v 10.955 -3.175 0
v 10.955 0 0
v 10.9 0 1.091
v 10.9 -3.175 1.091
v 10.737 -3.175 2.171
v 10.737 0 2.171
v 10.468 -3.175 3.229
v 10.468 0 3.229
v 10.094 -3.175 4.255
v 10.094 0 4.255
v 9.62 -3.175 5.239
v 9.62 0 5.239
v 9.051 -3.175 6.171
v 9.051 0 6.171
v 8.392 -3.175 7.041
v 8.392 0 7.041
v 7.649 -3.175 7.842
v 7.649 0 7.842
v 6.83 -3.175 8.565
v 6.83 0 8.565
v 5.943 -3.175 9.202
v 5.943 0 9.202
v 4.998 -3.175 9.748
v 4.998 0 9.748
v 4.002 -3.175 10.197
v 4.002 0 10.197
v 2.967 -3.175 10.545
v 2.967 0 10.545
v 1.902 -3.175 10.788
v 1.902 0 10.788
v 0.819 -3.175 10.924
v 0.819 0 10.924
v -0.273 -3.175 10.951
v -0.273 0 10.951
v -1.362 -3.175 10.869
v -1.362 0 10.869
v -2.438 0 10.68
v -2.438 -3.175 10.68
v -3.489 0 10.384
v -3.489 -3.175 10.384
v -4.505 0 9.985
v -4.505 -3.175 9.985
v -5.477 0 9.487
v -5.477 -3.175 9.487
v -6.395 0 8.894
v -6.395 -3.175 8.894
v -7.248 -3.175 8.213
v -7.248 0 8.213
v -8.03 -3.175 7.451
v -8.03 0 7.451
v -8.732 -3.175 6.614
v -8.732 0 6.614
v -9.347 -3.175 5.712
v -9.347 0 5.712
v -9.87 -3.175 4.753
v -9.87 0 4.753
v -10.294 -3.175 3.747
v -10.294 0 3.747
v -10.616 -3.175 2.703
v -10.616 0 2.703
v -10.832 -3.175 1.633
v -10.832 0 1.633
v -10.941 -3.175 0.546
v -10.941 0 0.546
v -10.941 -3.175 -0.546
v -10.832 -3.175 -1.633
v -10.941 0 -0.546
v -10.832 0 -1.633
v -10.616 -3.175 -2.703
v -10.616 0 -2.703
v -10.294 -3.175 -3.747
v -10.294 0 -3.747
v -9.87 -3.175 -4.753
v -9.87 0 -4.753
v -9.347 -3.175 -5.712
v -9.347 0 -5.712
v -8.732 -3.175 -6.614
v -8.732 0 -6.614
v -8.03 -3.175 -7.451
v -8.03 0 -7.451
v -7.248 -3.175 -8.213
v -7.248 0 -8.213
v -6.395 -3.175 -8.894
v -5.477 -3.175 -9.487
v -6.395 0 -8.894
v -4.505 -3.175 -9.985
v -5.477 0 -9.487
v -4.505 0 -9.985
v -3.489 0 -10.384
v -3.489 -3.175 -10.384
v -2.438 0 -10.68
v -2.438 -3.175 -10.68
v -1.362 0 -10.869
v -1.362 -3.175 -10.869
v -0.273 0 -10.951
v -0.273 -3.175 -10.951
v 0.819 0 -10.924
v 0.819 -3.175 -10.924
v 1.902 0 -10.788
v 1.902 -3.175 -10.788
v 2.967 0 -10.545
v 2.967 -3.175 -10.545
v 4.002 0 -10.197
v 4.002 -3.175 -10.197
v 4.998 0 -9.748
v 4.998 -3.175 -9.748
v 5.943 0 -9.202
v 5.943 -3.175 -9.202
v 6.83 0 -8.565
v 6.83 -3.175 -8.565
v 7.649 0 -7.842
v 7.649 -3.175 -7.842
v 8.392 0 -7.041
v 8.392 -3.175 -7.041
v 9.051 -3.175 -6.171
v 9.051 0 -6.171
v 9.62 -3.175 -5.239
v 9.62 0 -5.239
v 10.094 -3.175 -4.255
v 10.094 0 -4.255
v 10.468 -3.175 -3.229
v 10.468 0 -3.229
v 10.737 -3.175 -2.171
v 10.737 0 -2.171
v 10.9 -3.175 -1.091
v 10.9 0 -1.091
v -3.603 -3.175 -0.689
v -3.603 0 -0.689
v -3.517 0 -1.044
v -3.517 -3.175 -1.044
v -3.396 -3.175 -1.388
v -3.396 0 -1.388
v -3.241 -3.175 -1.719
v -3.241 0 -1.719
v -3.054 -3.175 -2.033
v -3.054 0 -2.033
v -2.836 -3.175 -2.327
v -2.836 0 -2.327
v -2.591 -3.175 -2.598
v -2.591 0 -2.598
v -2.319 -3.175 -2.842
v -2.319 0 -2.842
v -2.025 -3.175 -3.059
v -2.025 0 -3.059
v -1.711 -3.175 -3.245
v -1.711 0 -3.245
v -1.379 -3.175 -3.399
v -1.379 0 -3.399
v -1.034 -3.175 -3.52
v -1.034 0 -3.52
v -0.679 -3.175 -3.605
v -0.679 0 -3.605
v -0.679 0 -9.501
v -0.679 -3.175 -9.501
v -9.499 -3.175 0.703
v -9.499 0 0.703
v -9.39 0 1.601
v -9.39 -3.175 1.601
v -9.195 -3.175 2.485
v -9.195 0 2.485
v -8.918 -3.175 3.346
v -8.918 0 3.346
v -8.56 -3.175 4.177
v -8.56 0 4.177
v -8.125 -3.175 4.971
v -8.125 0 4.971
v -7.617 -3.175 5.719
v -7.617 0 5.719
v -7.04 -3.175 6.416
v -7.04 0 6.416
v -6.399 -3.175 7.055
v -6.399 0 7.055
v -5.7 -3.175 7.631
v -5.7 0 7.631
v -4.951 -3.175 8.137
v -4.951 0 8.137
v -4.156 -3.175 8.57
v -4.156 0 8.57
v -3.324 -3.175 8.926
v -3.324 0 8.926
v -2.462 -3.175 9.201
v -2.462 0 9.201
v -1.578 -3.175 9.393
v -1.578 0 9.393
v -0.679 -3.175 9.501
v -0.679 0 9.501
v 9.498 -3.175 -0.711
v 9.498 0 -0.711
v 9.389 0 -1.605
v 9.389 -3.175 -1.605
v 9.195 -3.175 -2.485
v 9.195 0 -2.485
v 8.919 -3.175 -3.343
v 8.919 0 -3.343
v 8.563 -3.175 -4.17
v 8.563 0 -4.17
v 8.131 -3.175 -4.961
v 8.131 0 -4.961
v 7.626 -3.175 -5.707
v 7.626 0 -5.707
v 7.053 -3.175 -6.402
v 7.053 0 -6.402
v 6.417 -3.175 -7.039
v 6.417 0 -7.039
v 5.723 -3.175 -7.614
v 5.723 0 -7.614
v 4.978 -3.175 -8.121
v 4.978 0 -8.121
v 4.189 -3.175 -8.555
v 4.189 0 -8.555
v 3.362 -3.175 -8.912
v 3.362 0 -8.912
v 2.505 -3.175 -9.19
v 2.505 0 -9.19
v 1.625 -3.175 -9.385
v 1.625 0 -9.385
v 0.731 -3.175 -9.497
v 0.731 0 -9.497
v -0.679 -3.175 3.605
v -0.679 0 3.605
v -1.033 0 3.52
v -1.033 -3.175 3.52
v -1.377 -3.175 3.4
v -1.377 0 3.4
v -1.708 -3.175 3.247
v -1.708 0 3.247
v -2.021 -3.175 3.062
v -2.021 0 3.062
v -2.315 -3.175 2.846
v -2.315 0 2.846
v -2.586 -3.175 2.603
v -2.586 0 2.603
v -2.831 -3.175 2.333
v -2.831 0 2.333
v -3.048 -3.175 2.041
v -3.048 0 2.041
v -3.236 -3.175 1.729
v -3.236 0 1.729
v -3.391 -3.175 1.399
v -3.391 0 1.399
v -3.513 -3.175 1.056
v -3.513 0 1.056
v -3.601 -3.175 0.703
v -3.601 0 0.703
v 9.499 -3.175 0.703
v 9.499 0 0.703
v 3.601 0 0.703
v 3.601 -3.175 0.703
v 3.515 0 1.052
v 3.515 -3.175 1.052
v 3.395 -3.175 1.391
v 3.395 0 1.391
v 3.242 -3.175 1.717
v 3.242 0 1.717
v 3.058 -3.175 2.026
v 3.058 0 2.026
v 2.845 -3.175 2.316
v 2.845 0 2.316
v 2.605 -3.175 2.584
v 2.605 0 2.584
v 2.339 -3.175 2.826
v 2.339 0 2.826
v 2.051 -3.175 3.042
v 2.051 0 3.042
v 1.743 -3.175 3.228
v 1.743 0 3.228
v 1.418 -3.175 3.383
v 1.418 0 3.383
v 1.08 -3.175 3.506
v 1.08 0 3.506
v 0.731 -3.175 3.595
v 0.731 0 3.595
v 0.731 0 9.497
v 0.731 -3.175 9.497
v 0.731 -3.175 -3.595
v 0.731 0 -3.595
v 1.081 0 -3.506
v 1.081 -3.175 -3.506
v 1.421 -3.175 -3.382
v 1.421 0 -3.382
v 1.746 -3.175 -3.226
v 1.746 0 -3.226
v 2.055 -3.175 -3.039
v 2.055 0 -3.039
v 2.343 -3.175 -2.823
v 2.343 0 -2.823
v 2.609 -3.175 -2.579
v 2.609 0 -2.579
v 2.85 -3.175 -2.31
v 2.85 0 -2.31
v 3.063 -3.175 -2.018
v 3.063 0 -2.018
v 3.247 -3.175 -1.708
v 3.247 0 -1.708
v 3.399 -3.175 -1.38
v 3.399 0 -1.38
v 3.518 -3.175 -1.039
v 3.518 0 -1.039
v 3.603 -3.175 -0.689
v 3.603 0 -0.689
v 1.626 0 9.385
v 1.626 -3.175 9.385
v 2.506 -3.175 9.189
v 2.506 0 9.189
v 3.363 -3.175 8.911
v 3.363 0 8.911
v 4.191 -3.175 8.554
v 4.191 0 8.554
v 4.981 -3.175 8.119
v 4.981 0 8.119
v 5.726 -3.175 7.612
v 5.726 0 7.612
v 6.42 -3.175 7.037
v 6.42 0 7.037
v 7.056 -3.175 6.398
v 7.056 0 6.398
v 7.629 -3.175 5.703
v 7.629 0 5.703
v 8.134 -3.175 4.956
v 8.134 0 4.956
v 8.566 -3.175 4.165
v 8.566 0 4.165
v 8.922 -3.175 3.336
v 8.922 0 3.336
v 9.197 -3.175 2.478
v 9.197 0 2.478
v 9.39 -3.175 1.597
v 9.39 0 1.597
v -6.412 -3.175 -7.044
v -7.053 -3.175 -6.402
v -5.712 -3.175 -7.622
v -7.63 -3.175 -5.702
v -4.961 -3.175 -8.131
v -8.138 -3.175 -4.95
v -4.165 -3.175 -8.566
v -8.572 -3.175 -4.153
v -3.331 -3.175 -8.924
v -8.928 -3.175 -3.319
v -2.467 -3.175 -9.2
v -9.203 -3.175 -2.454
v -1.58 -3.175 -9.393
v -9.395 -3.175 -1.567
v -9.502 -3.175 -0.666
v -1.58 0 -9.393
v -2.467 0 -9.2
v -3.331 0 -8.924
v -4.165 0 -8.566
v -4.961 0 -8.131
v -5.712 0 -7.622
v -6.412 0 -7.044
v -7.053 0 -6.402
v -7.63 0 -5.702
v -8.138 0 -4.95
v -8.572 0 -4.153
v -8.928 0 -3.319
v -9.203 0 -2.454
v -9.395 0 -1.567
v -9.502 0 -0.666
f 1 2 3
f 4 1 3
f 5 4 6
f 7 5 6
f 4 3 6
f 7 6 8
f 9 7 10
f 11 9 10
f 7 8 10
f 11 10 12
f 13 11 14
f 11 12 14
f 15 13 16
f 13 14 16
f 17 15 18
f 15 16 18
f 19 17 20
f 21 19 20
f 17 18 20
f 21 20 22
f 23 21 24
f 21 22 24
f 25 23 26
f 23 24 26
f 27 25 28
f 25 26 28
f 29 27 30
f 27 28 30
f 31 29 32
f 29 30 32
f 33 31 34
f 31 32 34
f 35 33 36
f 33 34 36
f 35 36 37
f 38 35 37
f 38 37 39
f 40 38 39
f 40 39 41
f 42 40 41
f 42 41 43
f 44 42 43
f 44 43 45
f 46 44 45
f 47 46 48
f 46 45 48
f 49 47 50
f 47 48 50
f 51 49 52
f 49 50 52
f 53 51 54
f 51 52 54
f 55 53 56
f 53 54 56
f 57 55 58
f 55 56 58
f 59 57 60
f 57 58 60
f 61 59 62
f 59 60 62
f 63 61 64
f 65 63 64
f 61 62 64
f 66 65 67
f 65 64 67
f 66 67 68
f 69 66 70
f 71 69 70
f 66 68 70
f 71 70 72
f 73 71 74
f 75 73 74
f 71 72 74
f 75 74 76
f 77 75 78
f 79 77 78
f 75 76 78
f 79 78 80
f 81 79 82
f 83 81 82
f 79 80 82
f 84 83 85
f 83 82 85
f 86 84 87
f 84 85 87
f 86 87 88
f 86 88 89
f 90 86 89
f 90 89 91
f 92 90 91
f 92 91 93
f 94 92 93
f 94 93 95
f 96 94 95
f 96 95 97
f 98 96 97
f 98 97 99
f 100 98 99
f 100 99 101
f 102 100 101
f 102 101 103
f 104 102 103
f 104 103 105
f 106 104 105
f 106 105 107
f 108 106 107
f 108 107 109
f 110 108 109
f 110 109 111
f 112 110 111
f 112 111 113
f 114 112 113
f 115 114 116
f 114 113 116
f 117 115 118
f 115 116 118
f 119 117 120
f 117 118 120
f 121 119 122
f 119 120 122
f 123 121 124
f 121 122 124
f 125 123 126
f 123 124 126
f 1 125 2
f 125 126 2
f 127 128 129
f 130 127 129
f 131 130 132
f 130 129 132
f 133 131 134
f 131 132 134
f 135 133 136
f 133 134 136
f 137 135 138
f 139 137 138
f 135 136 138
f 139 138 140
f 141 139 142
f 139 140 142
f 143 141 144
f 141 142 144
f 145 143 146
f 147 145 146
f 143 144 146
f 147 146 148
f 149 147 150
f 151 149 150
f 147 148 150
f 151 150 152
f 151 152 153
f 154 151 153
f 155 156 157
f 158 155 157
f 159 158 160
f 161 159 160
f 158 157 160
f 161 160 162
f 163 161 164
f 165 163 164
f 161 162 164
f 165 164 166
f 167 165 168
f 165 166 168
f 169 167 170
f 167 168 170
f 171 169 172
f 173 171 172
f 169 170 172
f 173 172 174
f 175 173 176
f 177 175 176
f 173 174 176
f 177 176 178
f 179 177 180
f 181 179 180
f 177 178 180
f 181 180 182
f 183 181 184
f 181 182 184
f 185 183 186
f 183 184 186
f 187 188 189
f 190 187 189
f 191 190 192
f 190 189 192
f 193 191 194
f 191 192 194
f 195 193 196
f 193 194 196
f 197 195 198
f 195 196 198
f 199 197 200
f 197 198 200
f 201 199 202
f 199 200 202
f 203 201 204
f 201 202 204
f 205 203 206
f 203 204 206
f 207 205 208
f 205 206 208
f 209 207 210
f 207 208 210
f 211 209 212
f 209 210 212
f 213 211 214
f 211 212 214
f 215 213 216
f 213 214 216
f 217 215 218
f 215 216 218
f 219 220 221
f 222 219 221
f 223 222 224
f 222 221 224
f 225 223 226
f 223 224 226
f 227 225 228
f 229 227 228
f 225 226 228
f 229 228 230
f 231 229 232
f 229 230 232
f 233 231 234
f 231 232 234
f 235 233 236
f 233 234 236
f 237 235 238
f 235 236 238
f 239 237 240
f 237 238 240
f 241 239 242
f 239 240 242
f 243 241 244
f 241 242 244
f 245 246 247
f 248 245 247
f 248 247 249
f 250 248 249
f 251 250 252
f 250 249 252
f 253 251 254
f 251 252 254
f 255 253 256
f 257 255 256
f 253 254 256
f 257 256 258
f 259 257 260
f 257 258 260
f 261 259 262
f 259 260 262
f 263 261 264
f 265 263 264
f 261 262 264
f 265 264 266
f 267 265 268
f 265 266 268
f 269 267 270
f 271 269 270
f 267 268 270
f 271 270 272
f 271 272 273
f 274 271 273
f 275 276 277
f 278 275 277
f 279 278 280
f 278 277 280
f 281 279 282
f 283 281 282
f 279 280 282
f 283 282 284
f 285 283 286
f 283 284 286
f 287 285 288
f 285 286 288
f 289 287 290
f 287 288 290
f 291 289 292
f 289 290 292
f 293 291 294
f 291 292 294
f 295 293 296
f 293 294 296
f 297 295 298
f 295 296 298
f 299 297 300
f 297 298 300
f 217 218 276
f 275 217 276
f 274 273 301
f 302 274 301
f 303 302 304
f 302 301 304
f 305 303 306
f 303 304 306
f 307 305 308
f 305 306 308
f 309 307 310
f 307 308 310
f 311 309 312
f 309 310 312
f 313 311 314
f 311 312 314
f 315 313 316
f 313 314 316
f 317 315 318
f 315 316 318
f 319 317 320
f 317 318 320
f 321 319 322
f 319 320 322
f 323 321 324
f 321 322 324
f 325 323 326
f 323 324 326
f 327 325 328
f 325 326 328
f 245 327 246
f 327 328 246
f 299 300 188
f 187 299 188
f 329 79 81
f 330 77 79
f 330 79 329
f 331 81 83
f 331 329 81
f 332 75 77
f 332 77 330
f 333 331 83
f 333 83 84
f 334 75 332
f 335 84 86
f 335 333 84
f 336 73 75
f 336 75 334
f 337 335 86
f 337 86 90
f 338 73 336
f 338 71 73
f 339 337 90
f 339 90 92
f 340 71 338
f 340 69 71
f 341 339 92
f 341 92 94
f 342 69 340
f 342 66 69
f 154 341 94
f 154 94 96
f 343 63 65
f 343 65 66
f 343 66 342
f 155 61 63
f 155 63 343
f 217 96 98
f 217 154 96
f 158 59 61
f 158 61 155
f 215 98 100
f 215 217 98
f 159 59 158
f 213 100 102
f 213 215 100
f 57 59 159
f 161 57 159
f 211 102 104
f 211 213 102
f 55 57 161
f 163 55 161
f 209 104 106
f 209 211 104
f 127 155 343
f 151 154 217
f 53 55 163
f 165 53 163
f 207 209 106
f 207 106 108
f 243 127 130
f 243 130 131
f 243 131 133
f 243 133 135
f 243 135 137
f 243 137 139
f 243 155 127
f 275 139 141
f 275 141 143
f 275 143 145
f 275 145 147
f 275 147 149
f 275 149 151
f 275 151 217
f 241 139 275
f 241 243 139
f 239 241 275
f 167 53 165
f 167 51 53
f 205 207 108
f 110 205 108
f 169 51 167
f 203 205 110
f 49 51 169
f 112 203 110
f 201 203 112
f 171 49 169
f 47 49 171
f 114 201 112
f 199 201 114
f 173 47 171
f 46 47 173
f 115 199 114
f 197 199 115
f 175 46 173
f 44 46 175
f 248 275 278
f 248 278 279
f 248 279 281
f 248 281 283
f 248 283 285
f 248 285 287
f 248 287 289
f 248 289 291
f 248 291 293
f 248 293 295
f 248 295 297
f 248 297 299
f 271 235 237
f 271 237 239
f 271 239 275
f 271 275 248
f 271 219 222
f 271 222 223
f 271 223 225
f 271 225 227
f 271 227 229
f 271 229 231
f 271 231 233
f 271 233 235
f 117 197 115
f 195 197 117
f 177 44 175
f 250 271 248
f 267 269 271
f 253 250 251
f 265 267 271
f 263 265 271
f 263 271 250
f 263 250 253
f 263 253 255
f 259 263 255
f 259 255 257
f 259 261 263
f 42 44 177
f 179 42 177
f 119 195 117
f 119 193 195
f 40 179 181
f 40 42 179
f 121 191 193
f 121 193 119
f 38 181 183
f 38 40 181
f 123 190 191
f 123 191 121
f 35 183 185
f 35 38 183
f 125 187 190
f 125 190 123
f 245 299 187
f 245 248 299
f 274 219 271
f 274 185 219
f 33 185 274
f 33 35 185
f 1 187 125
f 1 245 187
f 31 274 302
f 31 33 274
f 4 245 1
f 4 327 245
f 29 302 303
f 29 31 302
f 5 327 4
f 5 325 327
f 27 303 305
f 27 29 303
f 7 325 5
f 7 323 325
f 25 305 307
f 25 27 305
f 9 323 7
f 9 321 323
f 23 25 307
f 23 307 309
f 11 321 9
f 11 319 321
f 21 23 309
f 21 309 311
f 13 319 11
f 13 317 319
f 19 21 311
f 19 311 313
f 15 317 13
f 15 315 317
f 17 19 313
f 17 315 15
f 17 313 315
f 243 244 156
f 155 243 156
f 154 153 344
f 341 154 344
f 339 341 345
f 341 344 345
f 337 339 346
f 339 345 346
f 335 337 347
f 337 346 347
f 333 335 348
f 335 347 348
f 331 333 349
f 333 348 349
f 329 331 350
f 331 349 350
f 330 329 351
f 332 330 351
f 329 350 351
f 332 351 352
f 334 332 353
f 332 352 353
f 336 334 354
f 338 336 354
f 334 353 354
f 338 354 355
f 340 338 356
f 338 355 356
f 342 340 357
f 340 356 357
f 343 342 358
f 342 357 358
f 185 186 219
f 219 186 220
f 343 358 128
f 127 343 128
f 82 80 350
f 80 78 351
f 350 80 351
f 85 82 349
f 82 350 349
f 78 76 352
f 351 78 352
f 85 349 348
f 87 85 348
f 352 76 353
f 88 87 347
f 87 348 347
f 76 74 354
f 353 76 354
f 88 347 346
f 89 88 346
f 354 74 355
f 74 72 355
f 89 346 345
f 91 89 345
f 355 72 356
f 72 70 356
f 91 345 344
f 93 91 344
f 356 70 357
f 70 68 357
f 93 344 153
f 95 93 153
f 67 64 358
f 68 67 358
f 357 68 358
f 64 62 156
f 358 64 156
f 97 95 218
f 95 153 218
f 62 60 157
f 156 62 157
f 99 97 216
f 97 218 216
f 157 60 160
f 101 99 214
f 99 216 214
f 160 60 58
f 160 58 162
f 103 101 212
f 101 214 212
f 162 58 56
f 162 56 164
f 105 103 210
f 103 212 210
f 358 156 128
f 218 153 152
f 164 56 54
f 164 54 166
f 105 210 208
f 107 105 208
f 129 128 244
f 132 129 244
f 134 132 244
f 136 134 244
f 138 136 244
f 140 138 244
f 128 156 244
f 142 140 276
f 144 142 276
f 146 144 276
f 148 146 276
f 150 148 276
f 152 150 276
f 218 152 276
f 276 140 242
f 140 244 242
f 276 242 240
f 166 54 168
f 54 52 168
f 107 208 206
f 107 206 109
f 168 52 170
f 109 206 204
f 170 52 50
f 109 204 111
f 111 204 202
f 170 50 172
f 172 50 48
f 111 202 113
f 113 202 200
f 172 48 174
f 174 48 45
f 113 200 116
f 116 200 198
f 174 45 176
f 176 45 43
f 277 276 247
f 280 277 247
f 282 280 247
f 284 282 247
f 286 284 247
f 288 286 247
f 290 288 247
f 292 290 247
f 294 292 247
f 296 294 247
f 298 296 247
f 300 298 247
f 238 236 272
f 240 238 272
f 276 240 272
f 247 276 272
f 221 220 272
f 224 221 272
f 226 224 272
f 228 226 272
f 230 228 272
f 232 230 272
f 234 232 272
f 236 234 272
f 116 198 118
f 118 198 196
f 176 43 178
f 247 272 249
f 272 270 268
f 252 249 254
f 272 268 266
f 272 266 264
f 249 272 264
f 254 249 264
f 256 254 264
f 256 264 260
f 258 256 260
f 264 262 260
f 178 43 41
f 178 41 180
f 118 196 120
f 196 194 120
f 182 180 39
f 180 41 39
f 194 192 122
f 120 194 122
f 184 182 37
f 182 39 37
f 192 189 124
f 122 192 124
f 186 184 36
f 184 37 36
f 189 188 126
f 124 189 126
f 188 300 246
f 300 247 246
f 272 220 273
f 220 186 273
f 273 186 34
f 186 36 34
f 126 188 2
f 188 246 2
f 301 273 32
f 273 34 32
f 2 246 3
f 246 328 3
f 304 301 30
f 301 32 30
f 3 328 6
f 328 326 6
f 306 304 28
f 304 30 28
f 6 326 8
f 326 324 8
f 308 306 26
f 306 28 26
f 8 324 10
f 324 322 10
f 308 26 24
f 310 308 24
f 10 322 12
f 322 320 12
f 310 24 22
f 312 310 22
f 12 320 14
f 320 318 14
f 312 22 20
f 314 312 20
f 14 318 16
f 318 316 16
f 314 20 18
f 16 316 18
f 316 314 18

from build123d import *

# Parameters (mm, degrees)
F0_R     = 10.954504
F1_DEPTH = 3.175


with BuildPart() as f1:
    # F0 (on Front) → F1 (new body)
    with BuildSketch(Plane.XZ):
        Circle(F0_R)
        with BuildLine():
            ThreePointArc((9.499057, 0.702522), (9.518512, 0.3515), (9.525, 0))
            ThreePointArc((9.525, 0), (9.518348, -0.355918), (9.498401, -0.711339))
            ThreePointArc((9.498401, -0.711339), (6.742333, -6.728043), (0.73149, -9.49687))
            ThreePointArc((0.73149, -9.49687), (0.026314, -9.524964), (-0.679006, -9.500767))
            ThreePointArc((-0.679006, -9.500767), (-6.739803, -6.730578), (-9.501688, -0.665992))
            ThreePointArc((-9.501688, -0.665992), (-9.524982, 0.018312), (-9.499057, 0.702522))
            ThreePointArc((-9.499057, 0.702522), (-6.726851, 6.743523), (-0.679006, 9.500767))
            ThreePointArc((-0.679006, 9.500767), (0.026314, 9.524964), (0.73149, 9.49687))
            ThreePointArc((0.73149, 9.49687), (6.745455, 6.724913), (9.499057, 0.702522))
        make_face(mode=Mode.SUBTRACT)
        with BuildLine():
            ThreePointArc((3.668611, 0), (3.651599, 0.352898), (3.600718, 0.702522))
            ThreePointArc((3.600718, 0.702522), (2.604522, 2.583636), (0.73149, 3.594945))
            ThreePointArc((0.73149, 3.594945), (0.026741, 3.668514), (-0.679006, 3.605227))
            ThreePointArc((-0.679006, 3.605227), (-2.58562, 2.602552), (-3.600718, 0.702522))
            ThreePointArc((-3.600718, 0.702522), (-3.668605, 0.007053), (-3.603393, -0.688672))
            ThreePointArc((-3.603393, -0.688672), (-2.590619, -2.597576), (-0.679006, -3.605227))
            ThreePointArc((-0.679006, -3.605227), (0.026741, -3.668514), (0.73149, -3.594945))
            ThreePointArc((0.73149, -3.594945), (2.609484, -2.578624), (3.603393, -0.688672))
            ThreePointArc((3.603393, -0.688672), (3.65227, -0.345877), (3.668611, 0))
        make_face()
        with BuildLine():
            ThreePointArc((-0.679006, -9.500767), (0.026314, -9.524964), (0.73149, -9.49687))
            Line((0.73149, -9.49687), (0.73149, -3.594945))
            ThreePointArc((0.73149, -3.594945), (0.026741, -3.668514), (-0.679006, -3.605227))
            Line((-0.679006, -3.605227), (-0.679006, -9.500767))
        make_face()
        with BuildLine():
            Line((-3.600718, 0.702522), (-9.499057, 0.702522))
            ThreePointArc((-9.499057, 0.702522), (-9.524982, 0.018312), (-9.501688, -0.665992))
            Line((-9.501688, -0.665992), (-3.603393, -0.688672))
            ThreePointArc((-3.603393, -0.688672), (-3.668605, 0.007053), (-3.600718, 0.702522))
        make_face()
        with BuildLine():
            ThreePointArc((9.498401, -0.711339), (9.518348, -0.355918), (9.525, 0))
            ThreePointArc((9.525, 0), (9.518512, 0.3515), (9.499057, 0.702522))
            Line((9.499057, 0.702522), (3.600718, 0.702522))
            ThreePointArc((3.600718, 0.702522), (3.651599, 0.352898), (3.668611, 0))
            ThreePointArc((3.668611, 0), (3.65227, -0.345877), (3.603393, -0.688672))
            Line((3.603393, -0.688672), (9.498401, -0.711339))
        make_face()
        with BuildLine():
            Line((0.73149, 3.594945), (0.73149, 9.49687))
            ThreePointArc((0.73149, 9.49687), (0.026314, 9.524964), (-0.679006, 9.500767))
            Line((-0.679006, 9.500767), (-0.679006, 3.605227))
            ThreePointArc((-0.679006, 3.605227), (0.026741, 3.668514), (0.73149, 3.594945))
        make_face()
    extrude(amount=F1_DEPTH)


solid = f1.part
